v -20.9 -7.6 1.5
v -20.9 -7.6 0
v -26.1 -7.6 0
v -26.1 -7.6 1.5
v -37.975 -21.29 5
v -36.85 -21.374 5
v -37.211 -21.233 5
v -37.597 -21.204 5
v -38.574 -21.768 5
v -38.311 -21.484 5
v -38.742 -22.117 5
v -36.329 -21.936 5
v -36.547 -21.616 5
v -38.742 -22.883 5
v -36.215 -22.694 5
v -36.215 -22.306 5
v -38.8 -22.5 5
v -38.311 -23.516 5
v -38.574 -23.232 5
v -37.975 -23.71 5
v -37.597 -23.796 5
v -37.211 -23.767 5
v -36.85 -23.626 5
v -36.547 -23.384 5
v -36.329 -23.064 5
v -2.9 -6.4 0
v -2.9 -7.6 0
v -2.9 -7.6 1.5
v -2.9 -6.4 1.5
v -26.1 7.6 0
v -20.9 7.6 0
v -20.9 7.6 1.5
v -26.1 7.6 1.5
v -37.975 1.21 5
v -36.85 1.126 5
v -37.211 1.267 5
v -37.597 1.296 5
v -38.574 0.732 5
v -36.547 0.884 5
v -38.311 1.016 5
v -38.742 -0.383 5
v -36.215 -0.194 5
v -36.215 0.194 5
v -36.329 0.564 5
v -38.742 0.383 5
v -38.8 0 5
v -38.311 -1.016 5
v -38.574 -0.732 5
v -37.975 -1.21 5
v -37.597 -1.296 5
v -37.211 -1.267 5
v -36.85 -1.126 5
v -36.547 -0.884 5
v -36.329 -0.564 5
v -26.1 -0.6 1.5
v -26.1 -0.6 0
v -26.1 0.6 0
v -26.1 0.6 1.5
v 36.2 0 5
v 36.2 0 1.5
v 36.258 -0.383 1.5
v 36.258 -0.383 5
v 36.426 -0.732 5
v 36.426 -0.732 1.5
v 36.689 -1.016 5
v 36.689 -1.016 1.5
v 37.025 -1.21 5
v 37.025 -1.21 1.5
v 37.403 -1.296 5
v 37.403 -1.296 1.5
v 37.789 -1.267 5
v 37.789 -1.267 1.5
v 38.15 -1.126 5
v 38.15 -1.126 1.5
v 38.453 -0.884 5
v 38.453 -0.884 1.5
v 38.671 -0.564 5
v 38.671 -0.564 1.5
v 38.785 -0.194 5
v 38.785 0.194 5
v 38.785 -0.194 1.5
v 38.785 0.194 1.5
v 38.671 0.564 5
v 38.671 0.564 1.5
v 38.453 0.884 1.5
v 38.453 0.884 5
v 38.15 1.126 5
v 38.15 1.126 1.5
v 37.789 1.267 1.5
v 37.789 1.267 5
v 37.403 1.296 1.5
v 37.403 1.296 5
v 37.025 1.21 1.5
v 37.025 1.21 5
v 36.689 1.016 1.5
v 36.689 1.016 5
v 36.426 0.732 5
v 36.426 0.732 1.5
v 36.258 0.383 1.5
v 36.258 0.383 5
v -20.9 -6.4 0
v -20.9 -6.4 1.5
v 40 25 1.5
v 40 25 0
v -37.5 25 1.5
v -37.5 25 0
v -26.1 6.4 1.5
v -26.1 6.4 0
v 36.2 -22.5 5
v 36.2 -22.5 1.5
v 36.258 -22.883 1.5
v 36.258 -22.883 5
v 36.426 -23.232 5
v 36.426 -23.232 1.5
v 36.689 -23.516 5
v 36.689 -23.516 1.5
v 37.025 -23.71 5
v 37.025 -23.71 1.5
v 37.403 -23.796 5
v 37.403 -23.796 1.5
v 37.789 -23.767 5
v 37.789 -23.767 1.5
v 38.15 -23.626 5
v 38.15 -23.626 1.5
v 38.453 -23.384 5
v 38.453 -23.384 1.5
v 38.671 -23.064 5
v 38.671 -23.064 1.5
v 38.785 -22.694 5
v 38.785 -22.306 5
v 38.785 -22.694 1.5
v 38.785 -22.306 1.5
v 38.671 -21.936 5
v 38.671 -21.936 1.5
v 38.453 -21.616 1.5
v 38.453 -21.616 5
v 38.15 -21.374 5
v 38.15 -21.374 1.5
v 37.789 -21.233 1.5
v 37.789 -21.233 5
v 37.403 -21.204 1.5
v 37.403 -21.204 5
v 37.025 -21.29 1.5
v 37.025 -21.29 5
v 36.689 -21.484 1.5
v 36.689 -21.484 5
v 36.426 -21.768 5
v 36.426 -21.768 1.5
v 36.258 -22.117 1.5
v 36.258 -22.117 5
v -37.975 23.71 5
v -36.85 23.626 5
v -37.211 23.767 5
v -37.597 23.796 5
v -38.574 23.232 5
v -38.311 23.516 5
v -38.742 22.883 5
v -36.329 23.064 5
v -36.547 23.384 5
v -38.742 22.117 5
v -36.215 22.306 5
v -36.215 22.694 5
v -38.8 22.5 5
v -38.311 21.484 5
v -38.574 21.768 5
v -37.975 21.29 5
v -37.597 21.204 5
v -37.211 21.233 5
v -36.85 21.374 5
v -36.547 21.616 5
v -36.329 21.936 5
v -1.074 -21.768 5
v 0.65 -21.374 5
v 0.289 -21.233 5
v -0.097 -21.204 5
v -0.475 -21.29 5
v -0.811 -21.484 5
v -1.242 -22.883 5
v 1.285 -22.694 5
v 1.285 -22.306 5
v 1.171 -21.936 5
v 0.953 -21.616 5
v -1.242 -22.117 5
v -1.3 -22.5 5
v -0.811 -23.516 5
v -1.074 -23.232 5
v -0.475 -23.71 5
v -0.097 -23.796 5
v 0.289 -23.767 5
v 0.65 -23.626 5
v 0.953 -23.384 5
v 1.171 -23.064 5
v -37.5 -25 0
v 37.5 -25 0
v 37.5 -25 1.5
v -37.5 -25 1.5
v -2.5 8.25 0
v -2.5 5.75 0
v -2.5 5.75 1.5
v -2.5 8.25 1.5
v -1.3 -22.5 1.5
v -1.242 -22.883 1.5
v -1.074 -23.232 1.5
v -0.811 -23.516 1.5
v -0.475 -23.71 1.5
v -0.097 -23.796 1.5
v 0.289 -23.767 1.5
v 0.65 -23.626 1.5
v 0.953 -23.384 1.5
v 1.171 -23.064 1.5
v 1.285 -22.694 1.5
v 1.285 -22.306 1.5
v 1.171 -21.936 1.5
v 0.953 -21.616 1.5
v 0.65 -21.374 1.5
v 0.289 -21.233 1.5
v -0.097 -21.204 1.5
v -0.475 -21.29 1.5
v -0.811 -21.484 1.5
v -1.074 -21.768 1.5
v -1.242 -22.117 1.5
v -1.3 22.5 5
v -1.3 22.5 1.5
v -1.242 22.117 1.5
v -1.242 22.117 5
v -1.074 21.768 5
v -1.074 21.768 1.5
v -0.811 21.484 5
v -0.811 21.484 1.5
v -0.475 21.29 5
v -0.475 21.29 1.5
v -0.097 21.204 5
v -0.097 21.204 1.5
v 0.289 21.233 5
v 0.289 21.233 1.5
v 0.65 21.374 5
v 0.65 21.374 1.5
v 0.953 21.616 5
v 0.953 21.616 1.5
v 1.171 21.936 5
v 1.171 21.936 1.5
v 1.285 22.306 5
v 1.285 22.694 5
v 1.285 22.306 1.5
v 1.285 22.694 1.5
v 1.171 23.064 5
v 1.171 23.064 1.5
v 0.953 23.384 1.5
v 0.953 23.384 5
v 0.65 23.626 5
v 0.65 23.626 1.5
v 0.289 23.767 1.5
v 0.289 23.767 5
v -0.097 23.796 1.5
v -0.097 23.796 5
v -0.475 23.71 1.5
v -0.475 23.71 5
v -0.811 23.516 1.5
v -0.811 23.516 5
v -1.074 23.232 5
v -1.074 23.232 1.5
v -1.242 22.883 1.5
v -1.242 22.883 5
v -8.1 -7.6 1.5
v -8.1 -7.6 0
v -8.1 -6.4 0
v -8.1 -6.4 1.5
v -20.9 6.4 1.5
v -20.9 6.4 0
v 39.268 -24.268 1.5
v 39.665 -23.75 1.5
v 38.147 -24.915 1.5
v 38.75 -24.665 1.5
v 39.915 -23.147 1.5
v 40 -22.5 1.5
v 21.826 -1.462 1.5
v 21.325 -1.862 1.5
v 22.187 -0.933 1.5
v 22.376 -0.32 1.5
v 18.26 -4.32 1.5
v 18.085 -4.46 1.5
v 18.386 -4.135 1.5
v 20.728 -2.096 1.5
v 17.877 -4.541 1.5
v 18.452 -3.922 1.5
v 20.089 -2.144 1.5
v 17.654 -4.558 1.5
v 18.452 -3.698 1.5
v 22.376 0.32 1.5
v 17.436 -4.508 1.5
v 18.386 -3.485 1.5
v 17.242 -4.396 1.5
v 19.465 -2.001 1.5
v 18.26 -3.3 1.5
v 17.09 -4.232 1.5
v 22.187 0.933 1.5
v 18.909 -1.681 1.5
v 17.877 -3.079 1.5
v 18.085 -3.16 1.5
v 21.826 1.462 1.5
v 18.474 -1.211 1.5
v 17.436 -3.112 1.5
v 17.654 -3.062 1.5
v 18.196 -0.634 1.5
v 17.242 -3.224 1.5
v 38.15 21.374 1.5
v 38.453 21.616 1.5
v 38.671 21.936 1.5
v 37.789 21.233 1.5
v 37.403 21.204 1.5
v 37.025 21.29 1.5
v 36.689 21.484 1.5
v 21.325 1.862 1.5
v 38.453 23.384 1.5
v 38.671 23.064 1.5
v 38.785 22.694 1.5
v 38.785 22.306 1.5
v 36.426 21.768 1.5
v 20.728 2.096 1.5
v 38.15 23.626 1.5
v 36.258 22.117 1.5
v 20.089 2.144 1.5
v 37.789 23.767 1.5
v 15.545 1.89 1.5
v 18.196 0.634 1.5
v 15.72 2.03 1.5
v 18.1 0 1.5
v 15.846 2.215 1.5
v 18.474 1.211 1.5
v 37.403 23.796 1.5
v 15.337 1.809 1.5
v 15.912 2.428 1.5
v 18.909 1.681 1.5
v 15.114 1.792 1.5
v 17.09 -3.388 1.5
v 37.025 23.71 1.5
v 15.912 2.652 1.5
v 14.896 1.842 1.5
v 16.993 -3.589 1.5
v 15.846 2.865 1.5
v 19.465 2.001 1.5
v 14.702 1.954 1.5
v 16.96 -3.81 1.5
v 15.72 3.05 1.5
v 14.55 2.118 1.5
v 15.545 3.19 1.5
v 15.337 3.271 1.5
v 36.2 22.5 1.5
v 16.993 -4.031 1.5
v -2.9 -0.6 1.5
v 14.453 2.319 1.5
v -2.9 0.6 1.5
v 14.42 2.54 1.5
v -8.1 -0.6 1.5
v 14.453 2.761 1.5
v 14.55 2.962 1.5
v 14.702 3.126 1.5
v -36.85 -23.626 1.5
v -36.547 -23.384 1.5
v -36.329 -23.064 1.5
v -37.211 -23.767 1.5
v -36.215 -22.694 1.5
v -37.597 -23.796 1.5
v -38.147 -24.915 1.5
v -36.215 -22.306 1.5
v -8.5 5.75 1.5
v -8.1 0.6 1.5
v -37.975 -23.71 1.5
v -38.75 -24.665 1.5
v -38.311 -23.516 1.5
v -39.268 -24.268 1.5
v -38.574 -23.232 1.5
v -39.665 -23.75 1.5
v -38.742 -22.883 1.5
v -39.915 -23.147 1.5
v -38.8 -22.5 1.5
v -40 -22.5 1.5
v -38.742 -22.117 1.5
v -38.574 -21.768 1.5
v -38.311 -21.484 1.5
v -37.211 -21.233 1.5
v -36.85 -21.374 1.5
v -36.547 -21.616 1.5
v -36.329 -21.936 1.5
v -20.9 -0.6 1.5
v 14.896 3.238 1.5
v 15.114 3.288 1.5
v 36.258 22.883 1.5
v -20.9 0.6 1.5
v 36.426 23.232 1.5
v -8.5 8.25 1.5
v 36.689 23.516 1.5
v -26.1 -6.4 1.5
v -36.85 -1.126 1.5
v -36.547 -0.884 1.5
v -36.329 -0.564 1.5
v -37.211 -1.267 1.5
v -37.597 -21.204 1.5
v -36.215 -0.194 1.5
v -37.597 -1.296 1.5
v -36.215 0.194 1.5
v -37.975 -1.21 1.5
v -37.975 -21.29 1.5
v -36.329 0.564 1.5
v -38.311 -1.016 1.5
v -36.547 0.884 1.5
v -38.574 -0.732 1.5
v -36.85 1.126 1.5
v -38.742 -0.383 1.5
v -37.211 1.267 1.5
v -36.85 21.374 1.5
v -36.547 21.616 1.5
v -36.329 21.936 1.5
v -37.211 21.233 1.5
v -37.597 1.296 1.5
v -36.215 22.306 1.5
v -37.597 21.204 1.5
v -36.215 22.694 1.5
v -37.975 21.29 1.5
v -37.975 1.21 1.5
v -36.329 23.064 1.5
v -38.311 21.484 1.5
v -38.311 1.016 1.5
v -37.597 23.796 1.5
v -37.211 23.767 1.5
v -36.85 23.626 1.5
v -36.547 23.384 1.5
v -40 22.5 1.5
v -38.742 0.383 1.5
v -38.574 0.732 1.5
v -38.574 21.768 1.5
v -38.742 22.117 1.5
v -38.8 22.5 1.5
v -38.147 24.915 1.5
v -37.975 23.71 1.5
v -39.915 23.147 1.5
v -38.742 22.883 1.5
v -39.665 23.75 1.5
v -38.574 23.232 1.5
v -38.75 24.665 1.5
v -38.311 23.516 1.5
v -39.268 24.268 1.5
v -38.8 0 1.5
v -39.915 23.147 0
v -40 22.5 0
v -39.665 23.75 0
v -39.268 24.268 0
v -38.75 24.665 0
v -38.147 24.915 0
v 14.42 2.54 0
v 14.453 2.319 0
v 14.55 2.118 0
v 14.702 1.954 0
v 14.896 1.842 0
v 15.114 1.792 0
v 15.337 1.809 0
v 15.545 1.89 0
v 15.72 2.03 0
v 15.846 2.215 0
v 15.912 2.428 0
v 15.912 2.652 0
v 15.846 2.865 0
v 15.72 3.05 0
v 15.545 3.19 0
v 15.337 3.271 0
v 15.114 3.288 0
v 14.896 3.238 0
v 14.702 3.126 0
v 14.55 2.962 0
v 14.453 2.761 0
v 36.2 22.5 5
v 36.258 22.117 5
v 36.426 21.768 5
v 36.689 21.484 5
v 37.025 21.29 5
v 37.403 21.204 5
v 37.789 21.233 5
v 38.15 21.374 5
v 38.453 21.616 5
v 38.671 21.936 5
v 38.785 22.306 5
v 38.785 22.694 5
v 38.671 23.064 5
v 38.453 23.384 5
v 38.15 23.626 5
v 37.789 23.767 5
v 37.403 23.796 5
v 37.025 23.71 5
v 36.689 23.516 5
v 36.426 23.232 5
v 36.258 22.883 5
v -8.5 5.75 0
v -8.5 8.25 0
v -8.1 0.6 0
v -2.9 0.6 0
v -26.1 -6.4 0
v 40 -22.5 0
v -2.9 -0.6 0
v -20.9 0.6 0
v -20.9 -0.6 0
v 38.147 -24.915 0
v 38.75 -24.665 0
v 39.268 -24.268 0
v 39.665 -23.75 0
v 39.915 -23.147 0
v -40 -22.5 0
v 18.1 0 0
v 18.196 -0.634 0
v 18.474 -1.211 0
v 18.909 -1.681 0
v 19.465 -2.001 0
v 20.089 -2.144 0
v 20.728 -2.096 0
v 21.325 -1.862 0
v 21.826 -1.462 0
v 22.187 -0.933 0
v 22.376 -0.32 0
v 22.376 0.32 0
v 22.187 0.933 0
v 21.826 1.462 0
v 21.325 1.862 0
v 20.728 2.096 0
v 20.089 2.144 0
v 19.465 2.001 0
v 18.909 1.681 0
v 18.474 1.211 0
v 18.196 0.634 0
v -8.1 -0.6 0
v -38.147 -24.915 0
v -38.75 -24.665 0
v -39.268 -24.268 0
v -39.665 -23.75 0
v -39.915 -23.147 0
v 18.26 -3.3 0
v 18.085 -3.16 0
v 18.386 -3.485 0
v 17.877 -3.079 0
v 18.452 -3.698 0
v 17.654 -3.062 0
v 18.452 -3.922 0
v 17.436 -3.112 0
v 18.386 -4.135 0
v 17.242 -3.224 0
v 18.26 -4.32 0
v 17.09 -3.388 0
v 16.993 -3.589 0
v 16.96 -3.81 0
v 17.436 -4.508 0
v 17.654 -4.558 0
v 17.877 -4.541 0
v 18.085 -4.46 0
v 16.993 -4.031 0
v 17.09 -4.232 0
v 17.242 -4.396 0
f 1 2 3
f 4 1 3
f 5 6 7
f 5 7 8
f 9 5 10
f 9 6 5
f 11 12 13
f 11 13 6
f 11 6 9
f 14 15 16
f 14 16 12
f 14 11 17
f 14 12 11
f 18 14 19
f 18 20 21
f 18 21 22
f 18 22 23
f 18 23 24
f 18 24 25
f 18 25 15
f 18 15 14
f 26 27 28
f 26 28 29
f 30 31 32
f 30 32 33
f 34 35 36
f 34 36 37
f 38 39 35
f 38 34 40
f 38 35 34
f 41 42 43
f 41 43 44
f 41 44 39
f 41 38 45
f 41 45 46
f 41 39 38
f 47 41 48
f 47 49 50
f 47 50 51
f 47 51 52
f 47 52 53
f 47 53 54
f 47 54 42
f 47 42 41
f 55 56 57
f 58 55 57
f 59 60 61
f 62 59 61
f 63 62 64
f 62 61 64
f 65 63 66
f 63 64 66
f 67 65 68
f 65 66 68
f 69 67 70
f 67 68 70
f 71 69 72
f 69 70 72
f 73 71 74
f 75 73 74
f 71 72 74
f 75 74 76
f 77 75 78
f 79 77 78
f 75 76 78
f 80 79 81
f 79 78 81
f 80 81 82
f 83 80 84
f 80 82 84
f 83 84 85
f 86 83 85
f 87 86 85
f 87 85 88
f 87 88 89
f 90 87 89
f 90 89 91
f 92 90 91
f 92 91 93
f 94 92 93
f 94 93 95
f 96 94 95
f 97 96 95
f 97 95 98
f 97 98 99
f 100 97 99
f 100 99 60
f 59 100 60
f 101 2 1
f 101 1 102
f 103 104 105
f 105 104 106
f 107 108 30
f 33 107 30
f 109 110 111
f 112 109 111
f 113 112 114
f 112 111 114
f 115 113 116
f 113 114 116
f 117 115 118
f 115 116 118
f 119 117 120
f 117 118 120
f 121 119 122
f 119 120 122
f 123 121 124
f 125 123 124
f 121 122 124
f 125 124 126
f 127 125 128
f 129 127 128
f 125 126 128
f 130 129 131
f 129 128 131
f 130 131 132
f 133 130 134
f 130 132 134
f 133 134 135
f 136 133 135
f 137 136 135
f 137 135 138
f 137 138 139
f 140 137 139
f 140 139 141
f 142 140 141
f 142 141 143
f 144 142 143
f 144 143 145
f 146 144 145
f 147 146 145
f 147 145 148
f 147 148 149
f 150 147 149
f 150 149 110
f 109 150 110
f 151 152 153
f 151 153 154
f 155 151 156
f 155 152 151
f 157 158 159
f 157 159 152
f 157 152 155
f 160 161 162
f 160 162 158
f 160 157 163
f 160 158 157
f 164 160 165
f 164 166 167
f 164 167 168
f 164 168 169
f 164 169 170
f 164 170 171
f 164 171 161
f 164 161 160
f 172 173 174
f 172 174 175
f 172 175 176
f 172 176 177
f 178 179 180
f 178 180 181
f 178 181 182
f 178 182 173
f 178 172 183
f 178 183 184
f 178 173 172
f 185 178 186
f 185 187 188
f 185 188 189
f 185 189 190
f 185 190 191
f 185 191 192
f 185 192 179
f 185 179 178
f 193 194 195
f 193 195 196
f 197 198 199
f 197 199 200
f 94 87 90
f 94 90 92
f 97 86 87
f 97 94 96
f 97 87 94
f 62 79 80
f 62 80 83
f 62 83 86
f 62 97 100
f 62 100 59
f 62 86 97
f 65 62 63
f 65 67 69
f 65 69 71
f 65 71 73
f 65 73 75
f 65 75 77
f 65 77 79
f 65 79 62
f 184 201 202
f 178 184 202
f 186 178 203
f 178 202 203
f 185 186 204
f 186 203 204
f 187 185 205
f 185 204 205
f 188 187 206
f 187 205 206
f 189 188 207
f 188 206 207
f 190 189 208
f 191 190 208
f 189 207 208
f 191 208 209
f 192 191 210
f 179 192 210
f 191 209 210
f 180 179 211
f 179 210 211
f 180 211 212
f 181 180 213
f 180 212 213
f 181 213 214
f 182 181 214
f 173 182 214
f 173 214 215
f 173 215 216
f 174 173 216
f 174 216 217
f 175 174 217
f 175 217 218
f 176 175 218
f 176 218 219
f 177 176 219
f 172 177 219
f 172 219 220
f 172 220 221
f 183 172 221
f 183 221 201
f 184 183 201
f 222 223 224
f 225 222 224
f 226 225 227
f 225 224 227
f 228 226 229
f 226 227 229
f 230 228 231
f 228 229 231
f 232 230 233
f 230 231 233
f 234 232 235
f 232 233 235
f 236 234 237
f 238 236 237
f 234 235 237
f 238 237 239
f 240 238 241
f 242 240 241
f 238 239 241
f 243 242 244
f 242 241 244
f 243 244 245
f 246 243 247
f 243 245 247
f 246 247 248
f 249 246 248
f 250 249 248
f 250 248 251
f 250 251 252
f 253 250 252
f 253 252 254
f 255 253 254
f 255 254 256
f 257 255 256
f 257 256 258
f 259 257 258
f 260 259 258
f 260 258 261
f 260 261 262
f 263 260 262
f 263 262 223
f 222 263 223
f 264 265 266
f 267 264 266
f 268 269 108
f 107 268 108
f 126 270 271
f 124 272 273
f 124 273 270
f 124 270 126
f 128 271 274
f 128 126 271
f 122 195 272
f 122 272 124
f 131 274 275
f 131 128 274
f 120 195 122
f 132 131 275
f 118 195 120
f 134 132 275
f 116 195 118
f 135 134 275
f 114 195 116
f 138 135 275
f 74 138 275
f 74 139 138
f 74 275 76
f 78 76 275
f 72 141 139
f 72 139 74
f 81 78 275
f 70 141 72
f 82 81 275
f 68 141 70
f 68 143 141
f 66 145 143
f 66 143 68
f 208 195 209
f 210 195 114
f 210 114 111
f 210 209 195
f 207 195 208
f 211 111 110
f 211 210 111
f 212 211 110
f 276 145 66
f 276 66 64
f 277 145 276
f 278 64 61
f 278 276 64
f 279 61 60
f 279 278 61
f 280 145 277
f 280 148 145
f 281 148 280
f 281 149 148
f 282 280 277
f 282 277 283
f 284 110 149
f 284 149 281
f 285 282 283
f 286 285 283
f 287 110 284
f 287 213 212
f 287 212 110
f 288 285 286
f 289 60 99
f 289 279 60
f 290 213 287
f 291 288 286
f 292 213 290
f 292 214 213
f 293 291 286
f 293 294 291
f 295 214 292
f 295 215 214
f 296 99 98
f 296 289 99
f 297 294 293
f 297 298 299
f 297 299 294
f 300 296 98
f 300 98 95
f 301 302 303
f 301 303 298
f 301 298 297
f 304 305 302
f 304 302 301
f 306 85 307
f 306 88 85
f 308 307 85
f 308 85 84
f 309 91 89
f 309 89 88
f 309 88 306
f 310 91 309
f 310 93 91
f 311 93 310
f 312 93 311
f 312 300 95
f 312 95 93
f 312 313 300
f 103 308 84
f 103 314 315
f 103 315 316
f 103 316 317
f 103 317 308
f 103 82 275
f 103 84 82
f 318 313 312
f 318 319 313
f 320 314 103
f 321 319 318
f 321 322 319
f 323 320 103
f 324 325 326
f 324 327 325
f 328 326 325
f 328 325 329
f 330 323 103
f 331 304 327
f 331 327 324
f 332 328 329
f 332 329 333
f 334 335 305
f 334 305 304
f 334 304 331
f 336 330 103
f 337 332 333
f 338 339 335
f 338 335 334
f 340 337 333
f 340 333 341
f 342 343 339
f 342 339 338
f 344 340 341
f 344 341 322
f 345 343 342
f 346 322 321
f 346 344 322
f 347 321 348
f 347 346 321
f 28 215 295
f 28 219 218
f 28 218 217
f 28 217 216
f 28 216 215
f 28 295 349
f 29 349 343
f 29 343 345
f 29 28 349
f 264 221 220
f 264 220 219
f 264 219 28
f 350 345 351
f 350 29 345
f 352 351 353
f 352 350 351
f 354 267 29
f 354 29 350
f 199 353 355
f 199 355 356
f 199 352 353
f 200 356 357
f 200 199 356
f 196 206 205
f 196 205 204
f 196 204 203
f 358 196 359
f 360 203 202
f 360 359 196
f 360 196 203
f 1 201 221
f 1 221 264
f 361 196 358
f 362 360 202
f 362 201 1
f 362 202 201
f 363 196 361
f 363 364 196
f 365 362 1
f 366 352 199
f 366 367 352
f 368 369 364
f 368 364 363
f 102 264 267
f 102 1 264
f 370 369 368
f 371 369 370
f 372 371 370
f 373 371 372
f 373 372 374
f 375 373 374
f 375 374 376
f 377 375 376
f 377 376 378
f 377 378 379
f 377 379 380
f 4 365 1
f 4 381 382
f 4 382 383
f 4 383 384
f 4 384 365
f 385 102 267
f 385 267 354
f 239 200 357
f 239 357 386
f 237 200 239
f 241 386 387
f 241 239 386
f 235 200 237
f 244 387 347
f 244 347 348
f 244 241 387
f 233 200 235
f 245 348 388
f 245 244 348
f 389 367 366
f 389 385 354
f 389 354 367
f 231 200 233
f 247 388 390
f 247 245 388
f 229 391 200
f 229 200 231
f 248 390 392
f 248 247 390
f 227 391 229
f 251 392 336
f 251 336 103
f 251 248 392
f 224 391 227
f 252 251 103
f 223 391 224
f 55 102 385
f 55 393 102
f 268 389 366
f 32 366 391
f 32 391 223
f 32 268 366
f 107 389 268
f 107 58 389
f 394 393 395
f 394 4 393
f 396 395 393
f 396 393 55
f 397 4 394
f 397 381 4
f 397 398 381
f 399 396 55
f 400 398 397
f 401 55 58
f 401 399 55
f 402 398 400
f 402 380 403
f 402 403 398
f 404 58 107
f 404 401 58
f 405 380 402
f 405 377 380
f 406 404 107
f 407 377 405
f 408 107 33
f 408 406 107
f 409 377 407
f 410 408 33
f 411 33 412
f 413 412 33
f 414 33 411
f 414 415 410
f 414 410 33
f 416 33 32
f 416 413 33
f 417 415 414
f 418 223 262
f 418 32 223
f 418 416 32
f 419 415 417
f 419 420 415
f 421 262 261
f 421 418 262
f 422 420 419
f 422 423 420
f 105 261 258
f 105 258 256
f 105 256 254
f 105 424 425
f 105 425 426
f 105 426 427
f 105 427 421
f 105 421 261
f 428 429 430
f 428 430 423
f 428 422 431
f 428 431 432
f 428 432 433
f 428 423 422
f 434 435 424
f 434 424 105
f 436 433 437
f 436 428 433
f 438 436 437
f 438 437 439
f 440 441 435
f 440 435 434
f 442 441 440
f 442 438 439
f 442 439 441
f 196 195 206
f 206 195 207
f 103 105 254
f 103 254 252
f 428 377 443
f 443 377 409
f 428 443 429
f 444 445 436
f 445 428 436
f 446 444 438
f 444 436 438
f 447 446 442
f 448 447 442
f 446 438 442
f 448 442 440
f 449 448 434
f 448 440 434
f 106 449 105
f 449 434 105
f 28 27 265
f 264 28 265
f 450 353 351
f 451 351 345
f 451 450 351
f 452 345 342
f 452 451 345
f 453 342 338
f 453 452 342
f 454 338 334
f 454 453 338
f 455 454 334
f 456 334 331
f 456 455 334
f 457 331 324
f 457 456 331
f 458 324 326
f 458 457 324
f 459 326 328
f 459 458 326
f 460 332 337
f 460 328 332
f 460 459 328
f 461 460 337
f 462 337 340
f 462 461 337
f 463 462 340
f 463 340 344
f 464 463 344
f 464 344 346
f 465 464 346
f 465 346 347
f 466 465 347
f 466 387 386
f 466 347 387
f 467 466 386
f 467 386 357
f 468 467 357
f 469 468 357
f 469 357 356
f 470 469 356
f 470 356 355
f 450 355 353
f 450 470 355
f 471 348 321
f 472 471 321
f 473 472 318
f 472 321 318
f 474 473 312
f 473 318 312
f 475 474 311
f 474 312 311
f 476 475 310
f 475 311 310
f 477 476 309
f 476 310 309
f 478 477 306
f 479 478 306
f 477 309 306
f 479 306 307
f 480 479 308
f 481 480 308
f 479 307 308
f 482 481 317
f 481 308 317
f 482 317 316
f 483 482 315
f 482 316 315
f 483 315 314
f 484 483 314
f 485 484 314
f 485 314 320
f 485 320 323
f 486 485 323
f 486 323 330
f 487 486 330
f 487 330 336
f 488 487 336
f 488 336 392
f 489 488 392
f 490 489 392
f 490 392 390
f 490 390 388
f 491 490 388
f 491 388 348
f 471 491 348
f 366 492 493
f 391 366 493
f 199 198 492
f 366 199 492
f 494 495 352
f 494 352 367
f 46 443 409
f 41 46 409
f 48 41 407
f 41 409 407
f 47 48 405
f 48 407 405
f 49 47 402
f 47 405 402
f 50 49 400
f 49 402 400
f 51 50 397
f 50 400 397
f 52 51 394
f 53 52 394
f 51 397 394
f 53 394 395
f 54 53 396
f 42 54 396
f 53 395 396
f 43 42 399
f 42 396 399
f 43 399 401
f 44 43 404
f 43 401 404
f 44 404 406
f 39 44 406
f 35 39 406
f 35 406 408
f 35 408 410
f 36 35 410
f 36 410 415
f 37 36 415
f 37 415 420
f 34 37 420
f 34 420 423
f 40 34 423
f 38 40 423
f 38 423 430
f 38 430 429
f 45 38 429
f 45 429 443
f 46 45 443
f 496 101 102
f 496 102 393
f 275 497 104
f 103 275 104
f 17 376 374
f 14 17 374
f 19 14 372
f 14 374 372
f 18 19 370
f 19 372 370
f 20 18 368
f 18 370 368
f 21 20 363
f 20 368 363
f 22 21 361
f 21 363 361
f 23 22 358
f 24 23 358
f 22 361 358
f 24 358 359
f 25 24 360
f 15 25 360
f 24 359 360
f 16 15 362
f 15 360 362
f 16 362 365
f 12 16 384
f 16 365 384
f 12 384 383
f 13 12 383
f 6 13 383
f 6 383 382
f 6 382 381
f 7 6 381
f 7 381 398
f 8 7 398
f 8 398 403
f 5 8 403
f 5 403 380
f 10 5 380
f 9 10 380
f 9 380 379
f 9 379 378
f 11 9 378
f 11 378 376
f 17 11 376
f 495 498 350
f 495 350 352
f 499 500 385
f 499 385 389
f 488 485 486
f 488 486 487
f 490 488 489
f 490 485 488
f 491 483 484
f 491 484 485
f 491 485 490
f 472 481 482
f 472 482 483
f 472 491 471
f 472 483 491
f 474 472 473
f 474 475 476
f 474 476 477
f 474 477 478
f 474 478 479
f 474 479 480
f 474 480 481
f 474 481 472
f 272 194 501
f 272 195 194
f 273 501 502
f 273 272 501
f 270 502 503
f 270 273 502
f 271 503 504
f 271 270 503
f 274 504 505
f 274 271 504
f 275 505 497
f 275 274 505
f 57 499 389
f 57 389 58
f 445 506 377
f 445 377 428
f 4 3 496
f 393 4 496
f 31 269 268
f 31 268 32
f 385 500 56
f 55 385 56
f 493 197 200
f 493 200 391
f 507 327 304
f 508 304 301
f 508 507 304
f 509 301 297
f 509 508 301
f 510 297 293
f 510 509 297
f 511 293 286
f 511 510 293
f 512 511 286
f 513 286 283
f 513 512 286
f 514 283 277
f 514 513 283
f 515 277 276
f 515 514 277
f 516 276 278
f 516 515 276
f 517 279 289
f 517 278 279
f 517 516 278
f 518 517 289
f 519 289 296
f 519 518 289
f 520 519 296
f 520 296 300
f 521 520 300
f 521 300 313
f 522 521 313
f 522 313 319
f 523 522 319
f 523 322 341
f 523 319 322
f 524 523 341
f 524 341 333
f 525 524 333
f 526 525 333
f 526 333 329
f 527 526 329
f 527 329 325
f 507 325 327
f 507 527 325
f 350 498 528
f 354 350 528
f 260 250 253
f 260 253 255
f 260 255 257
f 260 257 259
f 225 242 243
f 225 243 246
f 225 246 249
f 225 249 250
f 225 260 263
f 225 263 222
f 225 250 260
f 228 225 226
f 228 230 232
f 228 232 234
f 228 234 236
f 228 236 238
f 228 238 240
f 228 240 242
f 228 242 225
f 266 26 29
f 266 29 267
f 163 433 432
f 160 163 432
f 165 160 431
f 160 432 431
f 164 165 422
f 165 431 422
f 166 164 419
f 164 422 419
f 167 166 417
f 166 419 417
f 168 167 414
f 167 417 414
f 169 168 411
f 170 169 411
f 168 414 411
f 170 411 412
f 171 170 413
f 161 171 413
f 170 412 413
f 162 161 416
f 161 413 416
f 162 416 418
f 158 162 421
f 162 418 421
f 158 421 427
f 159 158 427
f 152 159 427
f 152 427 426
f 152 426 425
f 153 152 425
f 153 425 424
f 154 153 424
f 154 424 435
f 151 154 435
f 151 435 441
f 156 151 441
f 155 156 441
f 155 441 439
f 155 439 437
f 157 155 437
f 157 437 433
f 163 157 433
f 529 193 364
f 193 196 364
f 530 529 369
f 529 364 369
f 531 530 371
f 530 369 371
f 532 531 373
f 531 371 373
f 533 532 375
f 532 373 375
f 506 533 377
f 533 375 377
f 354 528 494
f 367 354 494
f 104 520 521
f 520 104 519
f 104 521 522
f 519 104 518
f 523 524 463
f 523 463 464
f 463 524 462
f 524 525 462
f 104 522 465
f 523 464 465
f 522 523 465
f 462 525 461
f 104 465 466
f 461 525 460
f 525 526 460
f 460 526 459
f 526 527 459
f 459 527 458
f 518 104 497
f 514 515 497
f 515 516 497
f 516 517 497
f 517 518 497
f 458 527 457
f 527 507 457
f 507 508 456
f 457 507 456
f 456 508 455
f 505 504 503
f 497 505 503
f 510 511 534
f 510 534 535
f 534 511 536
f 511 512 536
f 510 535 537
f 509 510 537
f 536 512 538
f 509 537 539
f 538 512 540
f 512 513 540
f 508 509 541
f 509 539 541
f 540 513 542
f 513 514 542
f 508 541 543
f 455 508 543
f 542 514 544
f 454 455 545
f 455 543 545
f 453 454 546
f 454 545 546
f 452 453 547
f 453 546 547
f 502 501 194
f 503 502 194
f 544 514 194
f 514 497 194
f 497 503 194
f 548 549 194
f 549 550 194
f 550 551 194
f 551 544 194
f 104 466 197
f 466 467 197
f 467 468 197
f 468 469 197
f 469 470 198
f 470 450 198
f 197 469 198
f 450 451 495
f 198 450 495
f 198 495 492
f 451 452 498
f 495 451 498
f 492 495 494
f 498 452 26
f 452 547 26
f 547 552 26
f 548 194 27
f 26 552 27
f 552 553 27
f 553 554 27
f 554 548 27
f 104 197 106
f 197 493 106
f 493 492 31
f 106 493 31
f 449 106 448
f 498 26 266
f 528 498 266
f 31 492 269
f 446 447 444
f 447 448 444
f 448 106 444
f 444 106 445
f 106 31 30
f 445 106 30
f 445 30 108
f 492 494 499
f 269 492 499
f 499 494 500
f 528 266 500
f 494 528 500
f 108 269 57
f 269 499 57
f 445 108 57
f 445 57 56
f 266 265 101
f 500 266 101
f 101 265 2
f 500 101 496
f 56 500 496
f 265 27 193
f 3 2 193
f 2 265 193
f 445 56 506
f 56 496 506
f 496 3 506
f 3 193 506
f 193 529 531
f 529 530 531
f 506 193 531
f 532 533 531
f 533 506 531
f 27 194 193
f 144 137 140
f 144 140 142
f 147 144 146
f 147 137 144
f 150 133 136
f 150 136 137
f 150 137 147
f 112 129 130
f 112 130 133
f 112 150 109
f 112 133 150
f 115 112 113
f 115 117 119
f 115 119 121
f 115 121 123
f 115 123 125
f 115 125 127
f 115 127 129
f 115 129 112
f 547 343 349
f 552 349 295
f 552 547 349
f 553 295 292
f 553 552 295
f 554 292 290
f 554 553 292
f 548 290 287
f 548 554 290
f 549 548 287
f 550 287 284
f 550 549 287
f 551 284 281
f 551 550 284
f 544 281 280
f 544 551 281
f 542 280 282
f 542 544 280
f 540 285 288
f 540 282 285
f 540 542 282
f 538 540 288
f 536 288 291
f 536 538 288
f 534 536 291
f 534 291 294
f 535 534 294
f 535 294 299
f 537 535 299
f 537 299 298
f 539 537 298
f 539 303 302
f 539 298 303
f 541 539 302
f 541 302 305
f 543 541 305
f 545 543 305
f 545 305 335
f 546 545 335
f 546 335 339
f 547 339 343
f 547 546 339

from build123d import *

# Parameters (mm, degrees)
SKETCH1_W           = 50
SKETCH1_H           = 80
BOSS_EXTRUDE5_DEPTH = 1.5
SKETCH4_R           = 1.3
BOSS_EXTRUDE6_DEPTH = 5
SKETCH6_R           = 2.15
SKETCH6_R_2         = 0.75
SKETCH6_W           = 1.2
SKETCH6_H           = 5.2
SKETCH6_W_2         = 2.5
SKETCH6_H_2         = 6
CUT_EXTRUDE1_DEPTH  = 10
FILLET1_R           = 2.5


with BuildPart() as part:
    # Sketch1 → Boss-Extrude5 (new body)
    with BuildSketch(Plane(origin=(0, 0, 0), x_dir=(0, 1, 0), z_dir=(0, 0, 1))):
        Rectangle(SKETCH1_W, SKETCH1_H)
    extrude(amount=BOSS_EXTRUDE5_DEPTH)

    # Sketch4 → Boss-Extrude6 (add)
    with BuildSketch(Plane(origin=(0, 0, 0), x_dir=(0, 1, 0), z_dir=(0, 0, 1))):
        with Locations(Location((-22.5, 37.5, 0), (0, 0, 90))):
            Circle(SKETCH4_R)
        with Locations(Location((0, 37.5, 0), (0, 0, 90))):
            Circle(SKETCH4_R)
        with Locations(Location((22.5, 37.5, 0), (0, 0, 90))):
            Circle(SKETCH4_R)
        with Locations(Location((-22.5, 0, 0), (0, 0, 90))):
            Circle(SKETCH4_R)
        with Locations(Location((22.5, 0, 0), (0, 0, 90))):
            Circle(SKETCH4_R)
        with Locations(Location((22.5, -37.5, 0), (0, 0, 90))):
            Circle(SKETCH4_R)
        with Locations(Location((0, -37.5, 0), (0, 0, 90))):
            Circle(SKETCH4_R)
        with Locations(Location((-22.5, -37.5, 0), (0, 0, 90))):
            Circle(SKETCH4_R)
    extrude(amount=BOSS_EXTRUDE6_DEPTH)

    # Sketch6 → Cut-Extrude1 (cut)
    with BuildSketch(Plane(origin=(0, 0, 0), x_dir=(0, 1, 0), z_dir=(0, 0, 1))):
        with Locations(Location((0, -20.25, 0), (0, 0, 90))):
            Circle(SKETCH6_R)
        with Locations(Location((-3.81, -17.71, 0), (0, 0, 90))):
            Circle(SKETCH6_R_2)
        with Locations(Location((2.54, -15.17, 0), (0, 0, 90))):
            Circle(SKETCH6_R_2)
        with Locations((7, 23.5)):
            Rectangle(SKETCH6_W, SKETCH6_H)
        with Locations((0, 23.5)):
            Rectangle(SKETCH6_W, SKETCH6_H)
        with Locations((-7, 23.5)):
            Rectangle(SKETCH6_W, SKETCH6_H)
        with Locations((0, 5.5)):
            Rectangle(SKETCH6_W, SKETCH6_H)
        with Locations((-7, 5.5)):
            Rectangle(SKETCH6_W, SKETCH6_H)
        with Locations((7, 5.5)):
            Rectangle(SKETCH6_W_2, SKETCH6_H_2)
    extrude(amount=CUT_EXTRUDE1_DEPTH, mode=Mode.SUBTRACT)

    # Fillet1
    fillet1_edges = [part.edges().sort_by_distance(p)[0] for p in [
        (-40, -25, 0.75),
        (-40, 25, 0.75),
        (40, -25, 0.75),
    ]]
    fillet(fillet1_edges, radius=FILLET1_R)


solid = part.part
